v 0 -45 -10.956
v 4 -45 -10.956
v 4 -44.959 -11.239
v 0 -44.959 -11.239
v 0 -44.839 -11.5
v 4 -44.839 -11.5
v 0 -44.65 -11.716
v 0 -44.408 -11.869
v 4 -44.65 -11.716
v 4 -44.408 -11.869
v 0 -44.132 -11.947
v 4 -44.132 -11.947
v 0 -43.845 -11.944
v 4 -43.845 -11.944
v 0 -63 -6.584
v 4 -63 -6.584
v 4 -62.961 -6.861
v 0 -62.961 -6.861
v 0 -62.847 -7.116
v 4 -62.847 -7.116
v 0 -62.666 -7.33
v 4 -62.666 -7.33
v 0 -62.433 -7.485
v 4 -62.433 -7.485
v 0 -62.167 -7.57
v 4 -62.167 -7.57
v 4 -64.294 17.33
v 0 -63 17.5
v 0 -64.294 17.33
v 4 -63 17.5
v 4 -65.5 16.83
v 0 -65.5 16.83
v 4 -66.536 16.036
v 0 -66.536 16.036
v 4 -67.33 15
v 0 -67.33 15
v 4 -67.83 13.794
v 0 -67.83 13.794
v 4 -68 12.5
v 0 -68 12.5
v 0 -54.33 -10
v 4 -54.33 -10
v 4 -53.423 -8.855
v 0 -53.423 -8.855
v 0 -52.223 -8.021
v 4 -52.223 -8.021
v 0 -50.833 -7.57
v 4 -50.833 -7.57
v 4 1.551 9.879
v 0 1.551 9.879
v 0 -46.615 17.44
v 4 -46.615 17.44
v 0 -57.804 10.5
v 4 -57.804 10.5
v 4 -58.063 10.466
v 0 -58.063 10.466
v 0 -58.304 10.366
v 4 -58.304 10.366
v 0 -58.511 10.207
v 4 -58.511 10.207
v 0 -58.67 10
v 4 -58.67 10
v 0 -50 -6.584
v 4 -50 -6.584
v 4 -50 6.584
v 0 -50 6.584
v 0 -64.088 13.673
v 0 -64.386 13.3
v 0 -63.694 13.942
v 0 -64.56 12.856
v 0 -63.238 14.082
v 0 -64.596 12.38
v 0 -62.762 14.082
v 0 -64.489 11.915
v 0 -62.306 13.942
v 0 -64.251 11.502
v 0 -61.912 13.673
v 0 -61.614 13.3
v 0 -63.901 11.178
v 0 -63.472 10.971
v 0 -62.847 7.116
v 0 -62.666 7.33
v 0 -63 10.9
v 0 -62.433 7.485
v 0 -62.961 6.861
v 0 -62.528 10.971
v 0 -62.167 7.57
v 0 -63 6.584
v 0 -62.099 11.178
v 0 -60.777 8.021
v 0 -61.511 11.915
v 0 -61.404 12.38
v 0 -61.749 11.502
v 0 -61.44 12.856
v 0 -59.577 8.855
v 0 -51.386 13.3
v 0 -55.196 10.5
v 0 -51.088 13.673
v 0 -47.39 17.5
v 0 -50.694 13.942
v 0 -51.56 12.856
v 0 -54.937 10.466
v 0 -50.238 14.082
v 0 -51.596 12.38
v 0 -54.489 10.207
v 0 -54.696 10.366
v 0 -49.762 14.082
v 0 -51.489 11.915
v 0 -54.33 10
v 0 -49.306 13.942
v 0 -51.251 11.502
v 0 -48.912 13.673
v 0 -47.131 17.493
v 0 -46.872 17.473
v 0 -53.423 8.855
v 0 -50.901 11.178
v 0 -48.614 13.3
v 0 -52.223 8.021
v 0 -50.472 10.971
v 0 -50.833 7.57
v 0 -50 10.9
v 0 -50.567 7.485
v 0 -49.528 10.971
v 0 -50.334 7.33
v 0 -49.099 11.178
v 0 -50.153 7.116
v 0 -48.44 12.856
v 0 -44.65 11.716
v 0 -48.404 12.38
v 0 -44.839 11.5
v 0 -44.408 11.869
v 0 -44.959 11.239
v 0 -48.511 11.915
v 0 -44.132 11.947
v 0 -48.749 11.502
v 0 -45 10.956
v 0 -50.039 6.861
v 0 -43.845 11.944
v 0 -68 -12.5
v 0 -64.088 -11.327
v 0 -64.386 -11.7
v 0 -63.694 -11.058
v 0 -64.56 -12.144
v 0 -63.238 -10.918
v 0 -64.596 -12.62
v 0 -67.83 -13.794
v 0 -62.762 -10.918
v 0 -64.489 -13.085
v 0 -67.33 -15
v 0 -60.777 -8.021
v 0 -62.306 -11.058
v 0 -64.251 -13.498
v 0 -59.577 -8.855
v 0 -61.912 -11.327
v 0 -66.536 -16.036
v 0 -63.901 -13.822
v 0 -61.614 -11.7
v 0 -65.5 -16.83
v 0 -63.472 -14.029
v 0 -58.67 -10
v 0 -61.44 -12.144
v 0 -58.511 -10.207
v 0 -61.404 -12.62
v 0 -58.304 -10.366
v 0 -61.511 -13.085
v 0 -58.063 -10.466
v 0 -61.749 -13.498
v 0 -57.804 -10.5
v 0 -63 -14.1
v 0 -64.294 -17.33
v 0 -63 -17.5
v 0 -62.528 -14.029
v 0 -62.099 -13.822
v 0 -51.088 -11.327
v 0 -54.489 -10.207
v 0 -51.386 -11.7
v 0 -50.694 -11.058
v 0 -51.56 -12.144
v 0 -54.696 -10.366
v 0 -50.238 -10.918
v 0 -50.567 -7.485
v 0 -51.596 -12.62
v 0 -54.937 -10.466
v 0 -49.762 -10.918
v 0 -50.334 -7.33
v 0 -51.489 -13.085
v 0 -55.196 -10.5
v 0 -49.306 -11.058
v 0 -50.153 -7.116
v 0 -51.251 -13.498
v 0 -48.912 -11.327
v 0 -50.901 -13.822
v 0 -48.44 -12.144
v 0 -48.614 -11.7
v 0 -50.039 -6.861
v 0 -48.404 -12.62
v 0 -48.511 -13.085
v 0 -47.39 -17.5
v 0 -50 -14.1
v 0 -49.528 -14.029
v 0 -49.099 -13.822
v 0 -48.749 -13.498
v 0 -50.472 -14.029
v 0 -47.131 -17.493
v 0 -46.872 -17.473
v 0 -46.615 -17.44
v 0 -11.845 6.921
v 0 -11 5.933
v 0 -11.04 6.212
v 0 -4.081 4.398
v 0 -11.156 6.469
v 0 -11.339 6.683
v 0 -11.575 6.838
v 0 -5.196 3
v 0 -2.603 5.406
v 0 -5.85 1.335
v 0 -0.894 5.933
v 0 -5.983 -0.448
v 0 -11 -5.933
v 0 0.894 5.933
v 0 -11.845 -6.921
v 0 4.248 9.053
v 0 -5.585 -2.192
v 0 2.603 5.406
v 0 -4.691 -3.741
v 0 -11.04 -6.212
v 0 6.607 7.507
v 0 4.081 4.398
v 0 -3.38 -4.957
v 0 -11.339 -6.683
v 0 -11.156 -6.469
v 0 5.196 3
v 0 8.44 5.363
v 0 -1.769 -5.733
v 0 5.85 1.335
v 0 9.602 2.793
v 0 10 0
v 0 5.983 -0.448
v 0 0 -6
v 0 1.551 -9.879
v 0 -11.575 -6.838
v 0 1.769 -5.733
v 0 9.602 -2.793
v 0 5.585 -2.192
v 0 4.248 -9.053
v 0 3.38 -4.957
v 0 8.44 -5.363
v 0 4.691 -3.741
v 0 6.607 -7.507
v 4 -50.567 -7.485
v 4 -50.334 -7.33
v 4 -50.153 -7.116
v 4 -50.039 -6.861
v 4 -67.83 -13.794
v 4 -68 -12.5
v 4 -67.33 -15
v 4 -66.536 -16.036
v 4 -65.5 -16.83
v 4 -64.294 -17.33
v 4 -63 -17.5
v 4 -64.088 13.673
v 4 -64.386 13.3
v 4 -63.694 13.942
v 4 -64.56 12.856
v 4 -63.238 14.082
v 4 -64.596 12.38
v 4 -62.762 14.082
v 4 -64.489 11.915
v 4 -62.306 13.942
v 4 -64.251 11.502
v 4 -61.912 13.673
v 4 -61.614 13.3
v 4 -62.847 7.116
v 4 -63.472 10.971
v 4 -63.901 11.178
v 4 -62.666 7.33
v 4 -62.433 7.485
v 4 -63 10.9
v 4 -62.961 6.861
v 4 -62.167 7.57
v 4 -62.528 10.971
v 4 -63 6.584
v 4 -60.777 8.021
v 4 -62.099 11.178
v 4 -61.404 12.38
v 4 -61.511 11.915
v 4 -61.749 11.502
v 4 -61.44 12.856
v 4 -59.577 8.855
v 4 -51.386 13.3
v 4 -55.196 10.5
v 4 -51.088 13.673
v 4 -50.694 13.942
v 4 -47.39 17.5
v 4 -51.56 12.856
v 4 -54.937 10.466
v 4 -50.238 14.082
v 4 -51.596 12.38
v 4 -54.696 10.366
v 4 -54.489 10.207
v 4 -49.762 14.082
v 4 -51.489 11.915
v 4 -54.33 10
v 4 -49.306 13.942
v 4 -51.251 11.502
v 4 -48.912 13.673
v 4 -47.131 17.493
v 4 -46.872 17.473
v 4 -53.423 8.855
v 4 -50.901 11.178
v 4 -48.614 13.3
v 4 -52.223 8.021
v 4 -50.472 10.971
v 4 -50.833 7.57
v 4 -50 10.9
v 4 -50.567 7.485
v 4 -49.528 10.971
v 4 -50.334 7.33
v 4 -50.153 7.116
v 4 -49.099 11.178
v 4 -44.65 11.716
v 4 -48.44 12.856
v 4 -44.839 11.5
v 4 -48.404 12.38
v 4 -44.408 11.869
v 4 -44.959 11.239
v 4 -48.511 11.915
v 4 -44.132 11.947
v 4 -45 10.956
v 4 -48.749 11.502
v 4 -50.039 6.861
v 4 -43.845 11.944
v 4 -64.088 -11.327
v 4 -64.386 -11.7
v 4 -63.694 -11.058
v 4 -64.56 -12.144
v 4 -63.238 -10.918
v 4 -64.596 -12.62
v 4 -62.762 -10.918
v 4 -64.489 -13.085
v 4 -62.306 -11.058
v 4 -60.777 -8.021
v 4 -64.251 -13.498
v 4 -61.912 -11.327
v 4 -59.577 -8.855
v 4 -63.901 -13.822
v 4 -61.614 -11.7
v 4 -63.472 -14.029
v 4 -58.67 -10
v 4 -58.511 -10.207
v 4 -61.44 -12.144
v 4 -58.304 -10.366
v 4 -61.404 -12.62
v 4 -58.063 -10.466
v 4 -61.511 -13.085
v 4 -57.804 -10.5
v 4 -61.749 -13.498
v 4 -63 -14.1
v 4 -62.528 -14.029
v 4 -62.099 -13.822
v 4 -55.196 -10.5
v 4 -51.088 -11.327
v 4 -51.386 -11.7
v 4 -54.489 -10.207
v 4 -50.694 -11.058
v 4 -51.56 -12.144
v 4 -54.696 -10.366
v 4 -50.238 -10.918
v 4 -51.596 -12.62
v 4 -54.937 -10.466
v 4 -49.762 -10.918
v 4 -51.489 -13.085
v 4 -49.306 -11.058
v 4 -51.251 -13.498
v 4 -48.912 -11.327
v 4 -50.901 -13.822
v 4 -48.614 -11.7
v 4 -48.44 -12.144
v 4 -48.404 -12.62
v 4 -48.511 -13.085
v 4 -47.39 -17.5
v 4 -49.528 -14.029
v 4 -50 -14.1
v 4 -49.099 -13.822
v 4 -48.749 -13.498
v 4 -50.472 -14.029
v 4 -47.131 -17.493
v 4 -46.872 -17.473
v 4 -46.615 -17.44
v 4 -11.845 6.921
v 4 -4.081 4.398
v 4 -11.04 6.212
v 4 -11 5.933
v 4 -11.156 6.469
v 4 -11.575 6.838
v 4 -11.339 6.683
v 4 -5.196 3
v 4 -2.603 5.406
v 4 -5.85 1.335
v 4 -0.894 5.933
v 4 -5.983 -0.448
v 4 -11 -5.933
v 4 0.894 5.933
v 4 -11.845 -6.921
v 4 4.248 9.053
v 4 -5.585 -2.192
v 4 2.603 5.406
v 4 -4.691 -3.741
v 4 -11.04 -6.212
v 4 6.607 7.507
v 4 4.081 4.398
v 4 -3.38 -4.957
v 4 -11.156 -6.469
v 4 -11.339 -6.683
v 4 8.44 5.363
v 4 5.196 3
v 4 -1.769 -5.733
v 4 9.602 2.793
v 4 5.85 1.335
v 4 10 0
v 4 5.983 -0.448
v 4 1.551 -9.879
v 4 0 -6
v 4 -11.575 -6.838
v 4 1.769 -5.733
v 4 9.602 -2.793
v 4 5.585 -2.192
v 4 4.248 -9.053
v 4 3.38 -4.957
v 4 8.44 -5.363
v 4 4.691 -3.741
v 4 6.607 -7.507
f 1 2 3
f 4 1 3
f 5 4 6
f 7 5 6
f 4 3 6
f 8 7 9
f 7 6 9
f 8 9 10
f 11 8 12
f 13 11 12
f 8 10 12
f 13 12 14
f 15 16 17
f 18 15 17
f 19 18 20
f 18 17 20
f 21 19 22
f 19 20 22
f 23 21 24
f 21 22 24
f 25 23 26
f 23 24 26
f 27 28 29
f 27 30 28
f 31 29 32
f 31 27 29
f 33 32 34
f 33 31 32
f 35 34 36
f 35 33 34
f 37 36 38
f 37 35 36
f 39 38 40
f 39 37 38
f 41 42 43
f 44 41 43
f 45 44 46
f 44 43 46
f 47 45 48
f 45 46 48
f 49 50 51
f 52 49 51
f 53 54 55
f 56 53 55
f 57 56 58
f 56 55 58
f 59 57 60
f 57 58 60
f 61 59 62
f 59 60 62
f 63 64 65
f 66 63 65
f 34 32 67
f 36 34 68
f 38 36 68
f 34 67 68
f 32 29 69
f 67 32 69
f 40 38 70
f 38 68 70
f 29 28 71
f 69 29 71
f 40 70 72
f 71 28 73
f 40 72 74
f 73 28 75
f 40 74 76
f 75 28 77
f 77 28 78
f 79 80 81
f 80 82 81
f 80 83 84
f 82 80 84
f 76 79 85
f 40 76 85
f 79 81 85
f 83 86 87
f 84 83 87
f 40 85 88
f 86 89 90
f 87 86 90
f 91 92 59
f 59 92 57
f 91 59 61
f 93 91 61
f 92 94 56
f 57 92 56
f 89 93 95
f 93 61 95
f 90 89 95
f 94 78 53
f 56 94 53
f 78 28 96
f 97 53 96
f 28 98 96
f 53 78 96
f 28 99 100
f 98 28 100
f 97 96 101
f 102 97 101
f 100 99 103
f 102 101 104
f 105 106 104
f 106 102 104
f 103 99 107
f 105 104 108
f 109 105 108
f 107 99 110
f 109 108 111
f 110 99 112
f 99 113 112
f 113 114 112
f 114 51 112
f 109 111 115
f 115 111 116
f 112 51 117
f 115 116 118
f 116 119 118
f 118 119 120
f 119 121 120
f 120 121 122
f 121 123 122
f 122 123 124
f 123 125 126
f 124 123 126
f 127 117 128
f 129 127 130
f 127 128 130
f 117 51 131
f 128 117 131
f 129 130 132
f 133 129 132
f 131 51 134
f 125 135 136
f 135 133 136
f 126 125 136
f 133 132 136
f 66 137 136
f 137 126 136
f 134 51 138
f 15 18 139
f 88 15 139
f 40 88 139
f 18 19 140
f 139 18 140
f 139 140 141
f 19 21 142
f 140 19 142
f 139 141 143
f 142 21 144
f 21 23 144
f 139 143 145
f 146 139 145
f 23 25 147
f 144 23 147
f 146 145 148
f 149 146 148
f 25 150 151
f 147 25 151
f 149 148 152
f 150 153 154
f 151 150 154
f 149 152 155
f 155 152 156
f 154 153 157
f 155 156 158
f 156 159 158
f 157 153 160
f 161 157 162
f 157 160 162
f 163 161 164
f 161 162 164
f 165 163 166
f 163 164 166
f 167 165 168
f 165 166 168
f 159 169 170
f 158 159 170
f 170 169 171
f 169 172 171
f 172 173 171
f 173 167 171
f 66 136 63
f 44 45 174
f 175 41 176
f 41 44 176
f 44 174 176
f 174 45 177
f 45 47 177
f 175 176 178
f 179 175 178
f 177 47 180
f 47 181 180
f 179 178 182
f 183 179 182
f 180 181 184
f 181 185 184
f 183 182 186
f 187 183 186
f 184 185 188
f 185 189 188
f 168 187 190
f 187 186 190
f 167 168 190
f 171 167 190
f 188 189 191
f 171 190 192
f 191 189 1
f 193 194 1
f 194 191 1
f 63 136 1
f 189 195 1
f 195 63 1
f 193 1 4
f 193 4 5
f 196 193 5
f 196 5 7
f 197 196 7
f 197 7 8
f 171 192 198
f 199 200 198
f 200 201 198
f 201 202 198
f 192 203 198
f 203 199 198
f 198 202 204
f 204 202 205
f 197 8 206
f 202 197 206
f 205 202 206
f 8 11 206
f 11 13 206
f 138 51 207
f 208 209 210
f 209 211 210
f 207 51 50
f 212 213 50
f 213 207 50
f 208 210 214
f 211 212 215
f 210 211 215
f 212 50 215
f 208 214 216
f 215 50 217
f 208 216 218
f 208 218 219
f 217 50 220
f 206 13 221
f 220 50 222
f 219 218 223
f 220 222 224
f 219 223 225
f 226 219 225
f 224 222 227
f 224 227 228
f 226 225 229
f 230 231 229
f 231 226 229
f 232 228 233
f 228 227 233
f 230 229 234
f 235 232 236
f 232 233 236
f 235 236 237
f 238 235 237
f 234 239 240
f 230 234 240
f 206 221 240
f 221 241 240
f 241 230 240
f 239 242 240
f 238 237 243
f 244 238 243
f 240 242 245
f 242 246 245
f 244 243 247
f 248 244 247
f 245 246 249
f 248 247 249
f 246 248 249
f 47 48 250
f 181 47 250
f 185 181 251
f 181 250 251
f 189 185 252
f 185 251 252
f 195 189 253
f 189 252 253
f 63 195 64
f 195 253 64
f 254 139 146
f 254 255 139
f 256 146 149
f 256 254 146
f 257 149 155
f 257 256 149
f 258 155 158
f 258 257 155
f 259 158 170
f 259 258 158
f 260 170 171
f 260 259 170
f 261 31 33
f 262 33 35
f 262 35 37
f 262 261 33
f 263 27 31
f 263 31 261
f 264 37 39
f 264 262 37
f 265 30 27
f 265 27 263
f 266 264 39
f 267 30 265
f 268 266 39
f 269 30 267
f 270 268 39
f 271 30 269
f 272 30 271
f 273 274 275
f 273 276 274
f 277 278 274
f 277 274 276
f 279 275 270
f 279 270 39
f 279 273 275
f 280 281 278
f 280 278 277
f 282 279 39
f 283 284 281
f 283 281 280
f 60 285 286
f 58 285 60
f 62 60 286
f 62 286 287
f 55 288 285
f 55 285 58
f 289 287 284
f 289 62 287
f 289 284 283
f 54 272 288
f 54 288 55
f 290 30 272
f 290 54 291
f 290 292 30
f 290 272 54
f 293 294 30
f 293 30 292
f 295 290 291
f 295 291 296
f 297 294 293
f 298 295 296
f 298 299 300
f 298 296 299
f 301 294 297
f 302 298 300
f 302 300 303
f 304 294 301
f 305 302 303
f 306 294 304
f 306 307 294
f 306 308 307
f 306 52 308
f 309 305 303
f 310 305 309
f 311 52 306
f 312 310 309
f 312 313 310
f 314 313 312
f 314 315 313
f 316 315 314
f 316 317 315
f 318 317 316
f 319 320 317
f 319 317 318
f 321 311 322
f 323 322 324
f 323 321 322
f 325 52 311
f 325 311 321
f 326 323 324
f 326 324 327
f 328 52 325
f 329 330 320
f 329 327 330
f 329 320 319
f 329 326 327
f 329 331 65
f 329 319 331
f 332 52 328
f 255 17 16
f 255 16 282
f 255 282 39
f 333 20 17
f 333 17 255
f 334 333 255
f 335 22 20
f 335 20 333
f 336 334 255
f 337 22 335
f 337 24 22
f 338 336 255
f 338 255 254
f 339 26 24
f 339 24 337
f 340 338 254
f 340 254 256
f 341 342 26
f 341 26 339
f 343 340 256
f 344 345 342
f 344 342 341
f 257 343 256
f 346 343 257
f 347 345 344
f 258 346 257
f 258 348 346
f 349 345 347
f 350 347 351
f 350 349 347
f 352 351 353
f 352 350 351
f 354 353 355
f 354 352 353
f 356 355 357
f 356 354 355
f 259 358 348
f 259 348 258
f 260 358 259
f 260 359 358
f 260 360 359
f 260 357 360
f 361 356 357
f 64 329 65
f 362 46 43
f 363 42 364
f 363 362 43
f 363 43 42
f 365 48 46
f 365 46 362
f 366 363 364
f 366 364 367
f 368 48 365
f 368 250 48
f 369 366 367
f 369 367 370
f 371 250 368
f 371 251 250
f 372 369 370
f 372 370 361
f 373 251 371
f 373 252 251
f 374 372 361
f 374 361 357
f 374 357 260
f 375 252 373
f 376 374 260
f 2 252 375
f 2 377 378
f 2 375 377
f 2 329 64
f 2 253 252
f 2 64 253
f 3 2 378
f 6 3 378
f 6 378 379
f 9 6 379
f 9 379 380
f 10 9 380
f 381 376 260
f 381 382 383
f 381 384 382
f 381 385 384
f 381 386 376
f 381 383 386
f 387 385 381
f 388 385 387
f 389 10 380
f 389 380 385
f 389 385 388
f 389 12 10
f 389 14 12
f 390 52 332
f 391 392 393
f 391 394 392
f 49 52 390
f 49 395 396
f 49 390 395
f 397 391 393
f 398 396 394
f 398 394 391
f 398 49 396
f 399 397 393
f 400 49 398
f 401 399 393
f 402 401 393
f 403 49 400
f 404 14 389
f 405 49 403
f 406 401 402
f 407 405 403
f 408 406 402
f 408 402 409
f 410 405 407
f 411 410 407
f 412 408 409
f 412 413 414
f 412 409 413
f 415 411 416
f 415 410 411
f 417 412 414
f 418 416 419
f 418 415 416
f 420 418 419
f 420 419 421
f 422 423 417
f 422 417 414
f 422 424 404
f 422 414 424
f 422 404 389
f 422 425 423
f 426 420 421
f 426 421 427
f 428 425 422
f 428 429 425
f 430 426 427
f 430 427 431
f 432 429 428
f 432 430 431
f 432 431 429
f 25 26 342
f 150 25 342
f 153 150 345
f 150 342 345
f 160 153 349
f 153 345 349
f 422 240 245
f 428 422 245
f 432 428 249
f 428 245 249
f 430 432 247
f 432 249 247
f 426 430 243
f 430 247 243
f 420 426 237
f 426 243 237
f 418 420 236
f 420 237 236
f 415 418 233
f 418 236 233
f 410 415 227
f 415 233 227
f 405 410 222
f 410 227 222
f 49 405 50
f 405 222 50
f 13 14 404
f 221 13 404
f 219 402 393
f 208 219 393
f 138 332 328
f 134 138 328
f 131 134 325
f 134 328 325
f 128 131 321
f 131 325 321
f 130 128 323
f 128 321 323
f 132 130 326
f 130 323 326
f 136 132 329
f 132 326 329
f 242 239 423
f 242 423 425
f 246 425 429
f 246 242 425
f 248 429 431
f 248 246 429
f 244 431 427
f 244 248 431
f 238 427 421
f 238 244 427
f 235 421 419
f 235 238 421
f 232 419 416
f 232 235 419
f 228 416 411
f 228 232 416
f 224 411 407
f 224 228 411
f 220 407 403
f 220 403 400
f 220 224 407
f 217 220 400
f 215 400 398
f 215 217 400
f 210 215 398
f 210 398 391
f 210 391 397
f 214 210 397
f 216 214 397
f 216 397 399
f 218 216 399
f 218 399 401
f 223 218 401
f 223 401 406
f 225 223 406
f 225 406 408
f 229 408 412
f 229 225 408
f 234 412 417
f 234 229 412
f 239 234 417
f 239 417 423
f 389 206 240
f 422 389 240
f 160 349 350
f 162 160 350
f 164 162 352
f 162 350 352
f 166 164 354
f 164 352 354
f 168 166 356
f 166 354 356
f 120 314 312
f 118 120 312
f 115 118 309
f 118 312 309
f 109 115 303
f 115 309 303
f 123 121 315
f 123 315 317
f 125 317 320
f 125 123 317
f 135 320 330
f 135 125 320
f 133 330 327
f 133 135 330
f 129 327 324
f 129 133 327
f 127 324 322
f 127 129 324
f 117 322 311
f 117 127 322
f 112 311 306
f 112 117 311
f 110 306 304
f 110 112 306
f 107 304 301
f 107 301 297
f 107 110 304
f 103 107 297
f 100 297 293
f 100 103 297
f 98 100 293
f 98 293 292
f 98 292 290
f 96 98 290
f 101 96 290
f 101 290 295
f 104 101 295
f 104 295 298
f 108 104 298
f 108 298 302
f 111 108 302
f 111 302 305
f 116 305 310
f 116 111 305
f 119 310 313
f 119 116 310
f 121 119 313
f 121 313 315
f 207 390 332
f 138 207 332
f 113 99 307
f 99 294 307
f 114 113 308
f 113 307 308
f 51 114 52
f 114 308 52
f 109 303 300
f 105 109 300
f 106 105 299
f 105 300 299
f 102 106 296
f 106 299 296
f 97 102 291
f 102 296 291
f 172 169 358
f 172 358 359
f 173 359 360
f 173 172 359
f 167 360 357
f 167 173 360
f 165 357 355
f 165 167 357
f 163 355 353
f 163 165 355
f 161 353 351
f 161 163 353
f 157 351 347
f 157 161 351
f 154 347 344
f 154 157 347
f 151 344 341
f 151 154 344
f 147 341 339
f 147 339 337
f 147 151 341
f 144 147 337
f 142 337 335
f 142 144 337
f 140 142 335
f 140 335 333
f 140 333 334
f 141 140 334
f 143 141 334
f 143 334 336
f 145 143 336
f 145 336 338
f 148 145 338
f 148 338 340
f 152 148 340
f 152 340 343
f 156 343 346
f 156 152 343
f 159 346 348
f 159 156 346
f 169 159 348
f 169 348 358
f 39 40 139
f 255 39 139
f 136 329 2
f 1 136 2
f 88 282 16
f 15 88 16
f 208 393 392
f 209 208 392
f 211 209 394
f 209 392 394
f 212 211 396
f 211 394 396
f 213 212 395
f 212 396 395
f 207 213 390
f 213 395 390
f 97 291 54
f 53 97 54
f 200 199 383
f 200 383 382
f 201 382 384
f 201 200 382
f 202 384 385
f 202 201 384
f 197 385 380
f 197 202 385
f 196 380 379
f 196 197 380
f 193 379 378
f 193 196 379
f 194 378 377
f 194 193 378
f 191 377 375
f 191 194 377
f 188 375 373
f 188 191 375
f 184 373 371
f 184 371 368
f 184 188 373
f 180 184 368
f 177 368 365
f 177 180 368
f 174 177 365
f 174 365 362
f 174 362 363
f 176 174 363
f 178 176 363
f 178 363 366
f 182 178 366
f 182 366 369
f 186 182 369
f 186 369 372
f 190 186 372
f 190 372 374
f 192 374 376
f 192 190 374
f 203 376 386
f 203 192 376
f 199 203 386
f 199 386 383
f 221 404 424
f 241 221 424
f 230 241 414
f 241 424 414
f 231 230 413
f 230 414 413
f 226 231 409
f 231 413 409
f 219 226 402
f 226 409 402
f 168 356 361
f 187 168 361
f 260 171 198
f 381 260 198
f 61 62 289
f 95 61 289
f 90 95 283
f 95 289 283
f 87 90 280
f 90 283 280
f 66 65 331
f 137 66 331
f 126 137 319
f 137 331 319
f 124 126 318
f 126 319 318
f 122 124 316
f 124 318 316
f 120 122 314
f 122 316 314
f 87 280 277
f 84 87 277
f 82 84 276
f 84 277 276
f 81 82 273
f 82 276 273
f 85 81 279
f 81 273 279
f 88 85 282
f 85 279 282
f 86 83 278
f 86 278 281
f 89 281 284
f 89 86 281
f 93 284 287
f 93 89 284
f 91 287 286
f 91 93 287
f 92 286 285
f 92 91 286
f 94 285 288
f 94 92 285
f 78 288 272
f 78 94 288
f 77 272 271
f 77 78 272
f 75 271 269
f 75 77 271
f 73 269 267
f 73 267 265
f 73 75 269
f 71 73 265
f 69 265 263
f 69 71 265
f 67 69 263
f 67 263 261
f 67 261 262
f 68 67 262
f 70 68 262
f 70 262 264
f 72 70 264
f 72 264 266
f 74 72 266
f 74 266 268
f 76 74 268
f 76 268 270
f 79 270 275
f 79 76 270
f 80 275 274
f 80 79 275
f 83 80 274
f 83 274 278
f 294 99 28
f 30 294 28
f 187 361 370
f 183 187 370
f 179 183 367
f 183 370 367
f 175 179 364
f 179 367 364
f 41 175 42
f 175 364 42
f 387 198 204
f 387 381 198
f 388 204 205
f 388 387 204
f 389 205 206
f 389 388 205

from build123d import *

# Parameters (mm, degrees)
SKETCH_1_R          = 6
SKETCH_1_R_2        = 1.6
EXTRUDE_1_DEPTH     = 4
CUT_EXTRUDE_2_DEPTH = 71.329581259
FILLET_1_R          = 5


with BuildPart() as part:
    # 草图1 → 凸台-拉伸1 (new body)
    with BuildSketch(Plane(origin=(0, 0, 0), x_dir=(0, 0, -1), z_dir=(1, 0, 0))):
        with BuildLine():
            Line((-17.5, -47), (-17.5, -68))
            Line((-17.5, -68), (17.5, -68))
            Line((17.5, -68), (17.5, -47))
            Line((17.5, -47), (9.879034185, 1.550704218))
            ThreePointArc((9.879034185, 1.550704218), (0, 10), (-9.879034185, 1.550704218))
            Line((-9.879034185, 1.550704218), (-17.5, -47))
        make_face()
        Circle(SKETCH_1_R, mode=Mode.SUBTRACT)
        with Locations((-12.5, -50)):
            Circle(SKETCH_1_R_2, mode=Mode.SUBTRACT)
        with Locations((12.5, -50)):
            Circle(SKETCH_1_R_2, mode=Mode.SUBTRACT)
        with Locations((-12.5, -63)):
            Circle(SKETCH_1_R_2, mode=Mode.SUBTRACT)
        with Locations((12.5, -63)):
            Circle(SKETCH_1_R_2, mode=Mode.SUBTRACT)
    extrude(amount=EXTRUDE_1_DEPTH)

    # 草图3 → 切除-拉伸2 (cut, through all)
    with BuildSketch(Plane(origin=(4, 0, 0), x_dir=(0, 0, -1), z_dir=(1, 0, 0))):
        with BuildLine():
            Line((-6.920512772, -11.844929578), (-11.943527577, -43.844929578))
            ThreePointArc((-11.943527577, -43.844929578), (-11.715581533, -44.649972914), (-10.955624159, -45))
            Line((-10.955624159, -45), (10.955624159, -45))
            ThreePointArc((10.955624159, -45), (11.715581533, -44.649972914), (11.943527577, -43.844929578))
            Line((11.943527577, -43.844929578), (6.920512772, -11.844929578))
            ThreePointArc((6.920512772, -11.844929578), (6.582582268, -11.240042626), (5.932609354, -11))
            Line((5.932609354, -11), (-5.932609354, -11))
            ThreePointArc((-5.932609354, -11), (-6.582582268, -11.240042626), (-6.920512772, -11.844929578))
        make_face()
        with BuildLine():
            Line((-10.5, -55.196152423), (-10.5, -57.803847577))
            ThreePointArc((-10.5, -57.803847577), (-10.366025404, -58.303847577), (-10, -58.669872981))
            ThreePointArc((-10, -58.669872981), (-8.394106246, -60.146644697), (-7.569933514, -62.166666667))
            ThreePointArc((-7.569933514, -62.166666667), (-7.229417441, -62.763762616), (-6.583920217, -63))
            Line((-6.583920217, -63), (6.583920217, -63))
            ThreePointArc((6.583920217, -63), (7.229417441, -62.763762616), (7.569933514, -62.166666667))
            ThreePointArc((7.569933514, -62.166666667), (8.394106246, -60.146644697), (10, -58.669872981))
            ThreePointArc((10, -58.669872981), (10.366025404, -58.303847577), (10.5, -57.803847577))
            Line((10.5, -57.803847577), (10.5, -55.196152423))
            ThreePointArc((10.5, -55.196152423), (10.366025404, -54.696152423), (10, -54.330127019))
            ThreePointArc((10, -54.330127019), (8.394106246, -52.853355303), (7.569933514, -50.833333333))
            ThreePointArc((7.569933514, -50.833333333), (7.229417441, -50.236237384), (6.583920217, -50))
            Line((6.583920217, -50), (-6.583920217, -50))
            ThreePointArc((-6.583920217, -50), (-7.229417441, -50.236237384), (-7.569933514, -50.833333333))
            ThreePointArc((-7.569933514, -50.833333333), (-8.394106246, -52.853355303), (-10, -54.330127019))
            ThreePointArc((-10, -54.330127019), (-10.366025404, -54.696152423), (-10.5, -55.196152423))
        make_face()
    extrude(amount=-CUT_EXTRUDE_2_DEPTH, mode=Mode.SUBTRACT)

    # 圆角1
    fillet_1_edges = [part.edges().sort_by_distance(p)[0] for p in [
        (2, -47, -17.5),
        (2, -68, -17.5),
        (2, -68, 17.5),
        (2, -47, 17.5),
    ]]
    fillet(fillet_1_edges, radius=FILLET_1_R)


solid = part.part
